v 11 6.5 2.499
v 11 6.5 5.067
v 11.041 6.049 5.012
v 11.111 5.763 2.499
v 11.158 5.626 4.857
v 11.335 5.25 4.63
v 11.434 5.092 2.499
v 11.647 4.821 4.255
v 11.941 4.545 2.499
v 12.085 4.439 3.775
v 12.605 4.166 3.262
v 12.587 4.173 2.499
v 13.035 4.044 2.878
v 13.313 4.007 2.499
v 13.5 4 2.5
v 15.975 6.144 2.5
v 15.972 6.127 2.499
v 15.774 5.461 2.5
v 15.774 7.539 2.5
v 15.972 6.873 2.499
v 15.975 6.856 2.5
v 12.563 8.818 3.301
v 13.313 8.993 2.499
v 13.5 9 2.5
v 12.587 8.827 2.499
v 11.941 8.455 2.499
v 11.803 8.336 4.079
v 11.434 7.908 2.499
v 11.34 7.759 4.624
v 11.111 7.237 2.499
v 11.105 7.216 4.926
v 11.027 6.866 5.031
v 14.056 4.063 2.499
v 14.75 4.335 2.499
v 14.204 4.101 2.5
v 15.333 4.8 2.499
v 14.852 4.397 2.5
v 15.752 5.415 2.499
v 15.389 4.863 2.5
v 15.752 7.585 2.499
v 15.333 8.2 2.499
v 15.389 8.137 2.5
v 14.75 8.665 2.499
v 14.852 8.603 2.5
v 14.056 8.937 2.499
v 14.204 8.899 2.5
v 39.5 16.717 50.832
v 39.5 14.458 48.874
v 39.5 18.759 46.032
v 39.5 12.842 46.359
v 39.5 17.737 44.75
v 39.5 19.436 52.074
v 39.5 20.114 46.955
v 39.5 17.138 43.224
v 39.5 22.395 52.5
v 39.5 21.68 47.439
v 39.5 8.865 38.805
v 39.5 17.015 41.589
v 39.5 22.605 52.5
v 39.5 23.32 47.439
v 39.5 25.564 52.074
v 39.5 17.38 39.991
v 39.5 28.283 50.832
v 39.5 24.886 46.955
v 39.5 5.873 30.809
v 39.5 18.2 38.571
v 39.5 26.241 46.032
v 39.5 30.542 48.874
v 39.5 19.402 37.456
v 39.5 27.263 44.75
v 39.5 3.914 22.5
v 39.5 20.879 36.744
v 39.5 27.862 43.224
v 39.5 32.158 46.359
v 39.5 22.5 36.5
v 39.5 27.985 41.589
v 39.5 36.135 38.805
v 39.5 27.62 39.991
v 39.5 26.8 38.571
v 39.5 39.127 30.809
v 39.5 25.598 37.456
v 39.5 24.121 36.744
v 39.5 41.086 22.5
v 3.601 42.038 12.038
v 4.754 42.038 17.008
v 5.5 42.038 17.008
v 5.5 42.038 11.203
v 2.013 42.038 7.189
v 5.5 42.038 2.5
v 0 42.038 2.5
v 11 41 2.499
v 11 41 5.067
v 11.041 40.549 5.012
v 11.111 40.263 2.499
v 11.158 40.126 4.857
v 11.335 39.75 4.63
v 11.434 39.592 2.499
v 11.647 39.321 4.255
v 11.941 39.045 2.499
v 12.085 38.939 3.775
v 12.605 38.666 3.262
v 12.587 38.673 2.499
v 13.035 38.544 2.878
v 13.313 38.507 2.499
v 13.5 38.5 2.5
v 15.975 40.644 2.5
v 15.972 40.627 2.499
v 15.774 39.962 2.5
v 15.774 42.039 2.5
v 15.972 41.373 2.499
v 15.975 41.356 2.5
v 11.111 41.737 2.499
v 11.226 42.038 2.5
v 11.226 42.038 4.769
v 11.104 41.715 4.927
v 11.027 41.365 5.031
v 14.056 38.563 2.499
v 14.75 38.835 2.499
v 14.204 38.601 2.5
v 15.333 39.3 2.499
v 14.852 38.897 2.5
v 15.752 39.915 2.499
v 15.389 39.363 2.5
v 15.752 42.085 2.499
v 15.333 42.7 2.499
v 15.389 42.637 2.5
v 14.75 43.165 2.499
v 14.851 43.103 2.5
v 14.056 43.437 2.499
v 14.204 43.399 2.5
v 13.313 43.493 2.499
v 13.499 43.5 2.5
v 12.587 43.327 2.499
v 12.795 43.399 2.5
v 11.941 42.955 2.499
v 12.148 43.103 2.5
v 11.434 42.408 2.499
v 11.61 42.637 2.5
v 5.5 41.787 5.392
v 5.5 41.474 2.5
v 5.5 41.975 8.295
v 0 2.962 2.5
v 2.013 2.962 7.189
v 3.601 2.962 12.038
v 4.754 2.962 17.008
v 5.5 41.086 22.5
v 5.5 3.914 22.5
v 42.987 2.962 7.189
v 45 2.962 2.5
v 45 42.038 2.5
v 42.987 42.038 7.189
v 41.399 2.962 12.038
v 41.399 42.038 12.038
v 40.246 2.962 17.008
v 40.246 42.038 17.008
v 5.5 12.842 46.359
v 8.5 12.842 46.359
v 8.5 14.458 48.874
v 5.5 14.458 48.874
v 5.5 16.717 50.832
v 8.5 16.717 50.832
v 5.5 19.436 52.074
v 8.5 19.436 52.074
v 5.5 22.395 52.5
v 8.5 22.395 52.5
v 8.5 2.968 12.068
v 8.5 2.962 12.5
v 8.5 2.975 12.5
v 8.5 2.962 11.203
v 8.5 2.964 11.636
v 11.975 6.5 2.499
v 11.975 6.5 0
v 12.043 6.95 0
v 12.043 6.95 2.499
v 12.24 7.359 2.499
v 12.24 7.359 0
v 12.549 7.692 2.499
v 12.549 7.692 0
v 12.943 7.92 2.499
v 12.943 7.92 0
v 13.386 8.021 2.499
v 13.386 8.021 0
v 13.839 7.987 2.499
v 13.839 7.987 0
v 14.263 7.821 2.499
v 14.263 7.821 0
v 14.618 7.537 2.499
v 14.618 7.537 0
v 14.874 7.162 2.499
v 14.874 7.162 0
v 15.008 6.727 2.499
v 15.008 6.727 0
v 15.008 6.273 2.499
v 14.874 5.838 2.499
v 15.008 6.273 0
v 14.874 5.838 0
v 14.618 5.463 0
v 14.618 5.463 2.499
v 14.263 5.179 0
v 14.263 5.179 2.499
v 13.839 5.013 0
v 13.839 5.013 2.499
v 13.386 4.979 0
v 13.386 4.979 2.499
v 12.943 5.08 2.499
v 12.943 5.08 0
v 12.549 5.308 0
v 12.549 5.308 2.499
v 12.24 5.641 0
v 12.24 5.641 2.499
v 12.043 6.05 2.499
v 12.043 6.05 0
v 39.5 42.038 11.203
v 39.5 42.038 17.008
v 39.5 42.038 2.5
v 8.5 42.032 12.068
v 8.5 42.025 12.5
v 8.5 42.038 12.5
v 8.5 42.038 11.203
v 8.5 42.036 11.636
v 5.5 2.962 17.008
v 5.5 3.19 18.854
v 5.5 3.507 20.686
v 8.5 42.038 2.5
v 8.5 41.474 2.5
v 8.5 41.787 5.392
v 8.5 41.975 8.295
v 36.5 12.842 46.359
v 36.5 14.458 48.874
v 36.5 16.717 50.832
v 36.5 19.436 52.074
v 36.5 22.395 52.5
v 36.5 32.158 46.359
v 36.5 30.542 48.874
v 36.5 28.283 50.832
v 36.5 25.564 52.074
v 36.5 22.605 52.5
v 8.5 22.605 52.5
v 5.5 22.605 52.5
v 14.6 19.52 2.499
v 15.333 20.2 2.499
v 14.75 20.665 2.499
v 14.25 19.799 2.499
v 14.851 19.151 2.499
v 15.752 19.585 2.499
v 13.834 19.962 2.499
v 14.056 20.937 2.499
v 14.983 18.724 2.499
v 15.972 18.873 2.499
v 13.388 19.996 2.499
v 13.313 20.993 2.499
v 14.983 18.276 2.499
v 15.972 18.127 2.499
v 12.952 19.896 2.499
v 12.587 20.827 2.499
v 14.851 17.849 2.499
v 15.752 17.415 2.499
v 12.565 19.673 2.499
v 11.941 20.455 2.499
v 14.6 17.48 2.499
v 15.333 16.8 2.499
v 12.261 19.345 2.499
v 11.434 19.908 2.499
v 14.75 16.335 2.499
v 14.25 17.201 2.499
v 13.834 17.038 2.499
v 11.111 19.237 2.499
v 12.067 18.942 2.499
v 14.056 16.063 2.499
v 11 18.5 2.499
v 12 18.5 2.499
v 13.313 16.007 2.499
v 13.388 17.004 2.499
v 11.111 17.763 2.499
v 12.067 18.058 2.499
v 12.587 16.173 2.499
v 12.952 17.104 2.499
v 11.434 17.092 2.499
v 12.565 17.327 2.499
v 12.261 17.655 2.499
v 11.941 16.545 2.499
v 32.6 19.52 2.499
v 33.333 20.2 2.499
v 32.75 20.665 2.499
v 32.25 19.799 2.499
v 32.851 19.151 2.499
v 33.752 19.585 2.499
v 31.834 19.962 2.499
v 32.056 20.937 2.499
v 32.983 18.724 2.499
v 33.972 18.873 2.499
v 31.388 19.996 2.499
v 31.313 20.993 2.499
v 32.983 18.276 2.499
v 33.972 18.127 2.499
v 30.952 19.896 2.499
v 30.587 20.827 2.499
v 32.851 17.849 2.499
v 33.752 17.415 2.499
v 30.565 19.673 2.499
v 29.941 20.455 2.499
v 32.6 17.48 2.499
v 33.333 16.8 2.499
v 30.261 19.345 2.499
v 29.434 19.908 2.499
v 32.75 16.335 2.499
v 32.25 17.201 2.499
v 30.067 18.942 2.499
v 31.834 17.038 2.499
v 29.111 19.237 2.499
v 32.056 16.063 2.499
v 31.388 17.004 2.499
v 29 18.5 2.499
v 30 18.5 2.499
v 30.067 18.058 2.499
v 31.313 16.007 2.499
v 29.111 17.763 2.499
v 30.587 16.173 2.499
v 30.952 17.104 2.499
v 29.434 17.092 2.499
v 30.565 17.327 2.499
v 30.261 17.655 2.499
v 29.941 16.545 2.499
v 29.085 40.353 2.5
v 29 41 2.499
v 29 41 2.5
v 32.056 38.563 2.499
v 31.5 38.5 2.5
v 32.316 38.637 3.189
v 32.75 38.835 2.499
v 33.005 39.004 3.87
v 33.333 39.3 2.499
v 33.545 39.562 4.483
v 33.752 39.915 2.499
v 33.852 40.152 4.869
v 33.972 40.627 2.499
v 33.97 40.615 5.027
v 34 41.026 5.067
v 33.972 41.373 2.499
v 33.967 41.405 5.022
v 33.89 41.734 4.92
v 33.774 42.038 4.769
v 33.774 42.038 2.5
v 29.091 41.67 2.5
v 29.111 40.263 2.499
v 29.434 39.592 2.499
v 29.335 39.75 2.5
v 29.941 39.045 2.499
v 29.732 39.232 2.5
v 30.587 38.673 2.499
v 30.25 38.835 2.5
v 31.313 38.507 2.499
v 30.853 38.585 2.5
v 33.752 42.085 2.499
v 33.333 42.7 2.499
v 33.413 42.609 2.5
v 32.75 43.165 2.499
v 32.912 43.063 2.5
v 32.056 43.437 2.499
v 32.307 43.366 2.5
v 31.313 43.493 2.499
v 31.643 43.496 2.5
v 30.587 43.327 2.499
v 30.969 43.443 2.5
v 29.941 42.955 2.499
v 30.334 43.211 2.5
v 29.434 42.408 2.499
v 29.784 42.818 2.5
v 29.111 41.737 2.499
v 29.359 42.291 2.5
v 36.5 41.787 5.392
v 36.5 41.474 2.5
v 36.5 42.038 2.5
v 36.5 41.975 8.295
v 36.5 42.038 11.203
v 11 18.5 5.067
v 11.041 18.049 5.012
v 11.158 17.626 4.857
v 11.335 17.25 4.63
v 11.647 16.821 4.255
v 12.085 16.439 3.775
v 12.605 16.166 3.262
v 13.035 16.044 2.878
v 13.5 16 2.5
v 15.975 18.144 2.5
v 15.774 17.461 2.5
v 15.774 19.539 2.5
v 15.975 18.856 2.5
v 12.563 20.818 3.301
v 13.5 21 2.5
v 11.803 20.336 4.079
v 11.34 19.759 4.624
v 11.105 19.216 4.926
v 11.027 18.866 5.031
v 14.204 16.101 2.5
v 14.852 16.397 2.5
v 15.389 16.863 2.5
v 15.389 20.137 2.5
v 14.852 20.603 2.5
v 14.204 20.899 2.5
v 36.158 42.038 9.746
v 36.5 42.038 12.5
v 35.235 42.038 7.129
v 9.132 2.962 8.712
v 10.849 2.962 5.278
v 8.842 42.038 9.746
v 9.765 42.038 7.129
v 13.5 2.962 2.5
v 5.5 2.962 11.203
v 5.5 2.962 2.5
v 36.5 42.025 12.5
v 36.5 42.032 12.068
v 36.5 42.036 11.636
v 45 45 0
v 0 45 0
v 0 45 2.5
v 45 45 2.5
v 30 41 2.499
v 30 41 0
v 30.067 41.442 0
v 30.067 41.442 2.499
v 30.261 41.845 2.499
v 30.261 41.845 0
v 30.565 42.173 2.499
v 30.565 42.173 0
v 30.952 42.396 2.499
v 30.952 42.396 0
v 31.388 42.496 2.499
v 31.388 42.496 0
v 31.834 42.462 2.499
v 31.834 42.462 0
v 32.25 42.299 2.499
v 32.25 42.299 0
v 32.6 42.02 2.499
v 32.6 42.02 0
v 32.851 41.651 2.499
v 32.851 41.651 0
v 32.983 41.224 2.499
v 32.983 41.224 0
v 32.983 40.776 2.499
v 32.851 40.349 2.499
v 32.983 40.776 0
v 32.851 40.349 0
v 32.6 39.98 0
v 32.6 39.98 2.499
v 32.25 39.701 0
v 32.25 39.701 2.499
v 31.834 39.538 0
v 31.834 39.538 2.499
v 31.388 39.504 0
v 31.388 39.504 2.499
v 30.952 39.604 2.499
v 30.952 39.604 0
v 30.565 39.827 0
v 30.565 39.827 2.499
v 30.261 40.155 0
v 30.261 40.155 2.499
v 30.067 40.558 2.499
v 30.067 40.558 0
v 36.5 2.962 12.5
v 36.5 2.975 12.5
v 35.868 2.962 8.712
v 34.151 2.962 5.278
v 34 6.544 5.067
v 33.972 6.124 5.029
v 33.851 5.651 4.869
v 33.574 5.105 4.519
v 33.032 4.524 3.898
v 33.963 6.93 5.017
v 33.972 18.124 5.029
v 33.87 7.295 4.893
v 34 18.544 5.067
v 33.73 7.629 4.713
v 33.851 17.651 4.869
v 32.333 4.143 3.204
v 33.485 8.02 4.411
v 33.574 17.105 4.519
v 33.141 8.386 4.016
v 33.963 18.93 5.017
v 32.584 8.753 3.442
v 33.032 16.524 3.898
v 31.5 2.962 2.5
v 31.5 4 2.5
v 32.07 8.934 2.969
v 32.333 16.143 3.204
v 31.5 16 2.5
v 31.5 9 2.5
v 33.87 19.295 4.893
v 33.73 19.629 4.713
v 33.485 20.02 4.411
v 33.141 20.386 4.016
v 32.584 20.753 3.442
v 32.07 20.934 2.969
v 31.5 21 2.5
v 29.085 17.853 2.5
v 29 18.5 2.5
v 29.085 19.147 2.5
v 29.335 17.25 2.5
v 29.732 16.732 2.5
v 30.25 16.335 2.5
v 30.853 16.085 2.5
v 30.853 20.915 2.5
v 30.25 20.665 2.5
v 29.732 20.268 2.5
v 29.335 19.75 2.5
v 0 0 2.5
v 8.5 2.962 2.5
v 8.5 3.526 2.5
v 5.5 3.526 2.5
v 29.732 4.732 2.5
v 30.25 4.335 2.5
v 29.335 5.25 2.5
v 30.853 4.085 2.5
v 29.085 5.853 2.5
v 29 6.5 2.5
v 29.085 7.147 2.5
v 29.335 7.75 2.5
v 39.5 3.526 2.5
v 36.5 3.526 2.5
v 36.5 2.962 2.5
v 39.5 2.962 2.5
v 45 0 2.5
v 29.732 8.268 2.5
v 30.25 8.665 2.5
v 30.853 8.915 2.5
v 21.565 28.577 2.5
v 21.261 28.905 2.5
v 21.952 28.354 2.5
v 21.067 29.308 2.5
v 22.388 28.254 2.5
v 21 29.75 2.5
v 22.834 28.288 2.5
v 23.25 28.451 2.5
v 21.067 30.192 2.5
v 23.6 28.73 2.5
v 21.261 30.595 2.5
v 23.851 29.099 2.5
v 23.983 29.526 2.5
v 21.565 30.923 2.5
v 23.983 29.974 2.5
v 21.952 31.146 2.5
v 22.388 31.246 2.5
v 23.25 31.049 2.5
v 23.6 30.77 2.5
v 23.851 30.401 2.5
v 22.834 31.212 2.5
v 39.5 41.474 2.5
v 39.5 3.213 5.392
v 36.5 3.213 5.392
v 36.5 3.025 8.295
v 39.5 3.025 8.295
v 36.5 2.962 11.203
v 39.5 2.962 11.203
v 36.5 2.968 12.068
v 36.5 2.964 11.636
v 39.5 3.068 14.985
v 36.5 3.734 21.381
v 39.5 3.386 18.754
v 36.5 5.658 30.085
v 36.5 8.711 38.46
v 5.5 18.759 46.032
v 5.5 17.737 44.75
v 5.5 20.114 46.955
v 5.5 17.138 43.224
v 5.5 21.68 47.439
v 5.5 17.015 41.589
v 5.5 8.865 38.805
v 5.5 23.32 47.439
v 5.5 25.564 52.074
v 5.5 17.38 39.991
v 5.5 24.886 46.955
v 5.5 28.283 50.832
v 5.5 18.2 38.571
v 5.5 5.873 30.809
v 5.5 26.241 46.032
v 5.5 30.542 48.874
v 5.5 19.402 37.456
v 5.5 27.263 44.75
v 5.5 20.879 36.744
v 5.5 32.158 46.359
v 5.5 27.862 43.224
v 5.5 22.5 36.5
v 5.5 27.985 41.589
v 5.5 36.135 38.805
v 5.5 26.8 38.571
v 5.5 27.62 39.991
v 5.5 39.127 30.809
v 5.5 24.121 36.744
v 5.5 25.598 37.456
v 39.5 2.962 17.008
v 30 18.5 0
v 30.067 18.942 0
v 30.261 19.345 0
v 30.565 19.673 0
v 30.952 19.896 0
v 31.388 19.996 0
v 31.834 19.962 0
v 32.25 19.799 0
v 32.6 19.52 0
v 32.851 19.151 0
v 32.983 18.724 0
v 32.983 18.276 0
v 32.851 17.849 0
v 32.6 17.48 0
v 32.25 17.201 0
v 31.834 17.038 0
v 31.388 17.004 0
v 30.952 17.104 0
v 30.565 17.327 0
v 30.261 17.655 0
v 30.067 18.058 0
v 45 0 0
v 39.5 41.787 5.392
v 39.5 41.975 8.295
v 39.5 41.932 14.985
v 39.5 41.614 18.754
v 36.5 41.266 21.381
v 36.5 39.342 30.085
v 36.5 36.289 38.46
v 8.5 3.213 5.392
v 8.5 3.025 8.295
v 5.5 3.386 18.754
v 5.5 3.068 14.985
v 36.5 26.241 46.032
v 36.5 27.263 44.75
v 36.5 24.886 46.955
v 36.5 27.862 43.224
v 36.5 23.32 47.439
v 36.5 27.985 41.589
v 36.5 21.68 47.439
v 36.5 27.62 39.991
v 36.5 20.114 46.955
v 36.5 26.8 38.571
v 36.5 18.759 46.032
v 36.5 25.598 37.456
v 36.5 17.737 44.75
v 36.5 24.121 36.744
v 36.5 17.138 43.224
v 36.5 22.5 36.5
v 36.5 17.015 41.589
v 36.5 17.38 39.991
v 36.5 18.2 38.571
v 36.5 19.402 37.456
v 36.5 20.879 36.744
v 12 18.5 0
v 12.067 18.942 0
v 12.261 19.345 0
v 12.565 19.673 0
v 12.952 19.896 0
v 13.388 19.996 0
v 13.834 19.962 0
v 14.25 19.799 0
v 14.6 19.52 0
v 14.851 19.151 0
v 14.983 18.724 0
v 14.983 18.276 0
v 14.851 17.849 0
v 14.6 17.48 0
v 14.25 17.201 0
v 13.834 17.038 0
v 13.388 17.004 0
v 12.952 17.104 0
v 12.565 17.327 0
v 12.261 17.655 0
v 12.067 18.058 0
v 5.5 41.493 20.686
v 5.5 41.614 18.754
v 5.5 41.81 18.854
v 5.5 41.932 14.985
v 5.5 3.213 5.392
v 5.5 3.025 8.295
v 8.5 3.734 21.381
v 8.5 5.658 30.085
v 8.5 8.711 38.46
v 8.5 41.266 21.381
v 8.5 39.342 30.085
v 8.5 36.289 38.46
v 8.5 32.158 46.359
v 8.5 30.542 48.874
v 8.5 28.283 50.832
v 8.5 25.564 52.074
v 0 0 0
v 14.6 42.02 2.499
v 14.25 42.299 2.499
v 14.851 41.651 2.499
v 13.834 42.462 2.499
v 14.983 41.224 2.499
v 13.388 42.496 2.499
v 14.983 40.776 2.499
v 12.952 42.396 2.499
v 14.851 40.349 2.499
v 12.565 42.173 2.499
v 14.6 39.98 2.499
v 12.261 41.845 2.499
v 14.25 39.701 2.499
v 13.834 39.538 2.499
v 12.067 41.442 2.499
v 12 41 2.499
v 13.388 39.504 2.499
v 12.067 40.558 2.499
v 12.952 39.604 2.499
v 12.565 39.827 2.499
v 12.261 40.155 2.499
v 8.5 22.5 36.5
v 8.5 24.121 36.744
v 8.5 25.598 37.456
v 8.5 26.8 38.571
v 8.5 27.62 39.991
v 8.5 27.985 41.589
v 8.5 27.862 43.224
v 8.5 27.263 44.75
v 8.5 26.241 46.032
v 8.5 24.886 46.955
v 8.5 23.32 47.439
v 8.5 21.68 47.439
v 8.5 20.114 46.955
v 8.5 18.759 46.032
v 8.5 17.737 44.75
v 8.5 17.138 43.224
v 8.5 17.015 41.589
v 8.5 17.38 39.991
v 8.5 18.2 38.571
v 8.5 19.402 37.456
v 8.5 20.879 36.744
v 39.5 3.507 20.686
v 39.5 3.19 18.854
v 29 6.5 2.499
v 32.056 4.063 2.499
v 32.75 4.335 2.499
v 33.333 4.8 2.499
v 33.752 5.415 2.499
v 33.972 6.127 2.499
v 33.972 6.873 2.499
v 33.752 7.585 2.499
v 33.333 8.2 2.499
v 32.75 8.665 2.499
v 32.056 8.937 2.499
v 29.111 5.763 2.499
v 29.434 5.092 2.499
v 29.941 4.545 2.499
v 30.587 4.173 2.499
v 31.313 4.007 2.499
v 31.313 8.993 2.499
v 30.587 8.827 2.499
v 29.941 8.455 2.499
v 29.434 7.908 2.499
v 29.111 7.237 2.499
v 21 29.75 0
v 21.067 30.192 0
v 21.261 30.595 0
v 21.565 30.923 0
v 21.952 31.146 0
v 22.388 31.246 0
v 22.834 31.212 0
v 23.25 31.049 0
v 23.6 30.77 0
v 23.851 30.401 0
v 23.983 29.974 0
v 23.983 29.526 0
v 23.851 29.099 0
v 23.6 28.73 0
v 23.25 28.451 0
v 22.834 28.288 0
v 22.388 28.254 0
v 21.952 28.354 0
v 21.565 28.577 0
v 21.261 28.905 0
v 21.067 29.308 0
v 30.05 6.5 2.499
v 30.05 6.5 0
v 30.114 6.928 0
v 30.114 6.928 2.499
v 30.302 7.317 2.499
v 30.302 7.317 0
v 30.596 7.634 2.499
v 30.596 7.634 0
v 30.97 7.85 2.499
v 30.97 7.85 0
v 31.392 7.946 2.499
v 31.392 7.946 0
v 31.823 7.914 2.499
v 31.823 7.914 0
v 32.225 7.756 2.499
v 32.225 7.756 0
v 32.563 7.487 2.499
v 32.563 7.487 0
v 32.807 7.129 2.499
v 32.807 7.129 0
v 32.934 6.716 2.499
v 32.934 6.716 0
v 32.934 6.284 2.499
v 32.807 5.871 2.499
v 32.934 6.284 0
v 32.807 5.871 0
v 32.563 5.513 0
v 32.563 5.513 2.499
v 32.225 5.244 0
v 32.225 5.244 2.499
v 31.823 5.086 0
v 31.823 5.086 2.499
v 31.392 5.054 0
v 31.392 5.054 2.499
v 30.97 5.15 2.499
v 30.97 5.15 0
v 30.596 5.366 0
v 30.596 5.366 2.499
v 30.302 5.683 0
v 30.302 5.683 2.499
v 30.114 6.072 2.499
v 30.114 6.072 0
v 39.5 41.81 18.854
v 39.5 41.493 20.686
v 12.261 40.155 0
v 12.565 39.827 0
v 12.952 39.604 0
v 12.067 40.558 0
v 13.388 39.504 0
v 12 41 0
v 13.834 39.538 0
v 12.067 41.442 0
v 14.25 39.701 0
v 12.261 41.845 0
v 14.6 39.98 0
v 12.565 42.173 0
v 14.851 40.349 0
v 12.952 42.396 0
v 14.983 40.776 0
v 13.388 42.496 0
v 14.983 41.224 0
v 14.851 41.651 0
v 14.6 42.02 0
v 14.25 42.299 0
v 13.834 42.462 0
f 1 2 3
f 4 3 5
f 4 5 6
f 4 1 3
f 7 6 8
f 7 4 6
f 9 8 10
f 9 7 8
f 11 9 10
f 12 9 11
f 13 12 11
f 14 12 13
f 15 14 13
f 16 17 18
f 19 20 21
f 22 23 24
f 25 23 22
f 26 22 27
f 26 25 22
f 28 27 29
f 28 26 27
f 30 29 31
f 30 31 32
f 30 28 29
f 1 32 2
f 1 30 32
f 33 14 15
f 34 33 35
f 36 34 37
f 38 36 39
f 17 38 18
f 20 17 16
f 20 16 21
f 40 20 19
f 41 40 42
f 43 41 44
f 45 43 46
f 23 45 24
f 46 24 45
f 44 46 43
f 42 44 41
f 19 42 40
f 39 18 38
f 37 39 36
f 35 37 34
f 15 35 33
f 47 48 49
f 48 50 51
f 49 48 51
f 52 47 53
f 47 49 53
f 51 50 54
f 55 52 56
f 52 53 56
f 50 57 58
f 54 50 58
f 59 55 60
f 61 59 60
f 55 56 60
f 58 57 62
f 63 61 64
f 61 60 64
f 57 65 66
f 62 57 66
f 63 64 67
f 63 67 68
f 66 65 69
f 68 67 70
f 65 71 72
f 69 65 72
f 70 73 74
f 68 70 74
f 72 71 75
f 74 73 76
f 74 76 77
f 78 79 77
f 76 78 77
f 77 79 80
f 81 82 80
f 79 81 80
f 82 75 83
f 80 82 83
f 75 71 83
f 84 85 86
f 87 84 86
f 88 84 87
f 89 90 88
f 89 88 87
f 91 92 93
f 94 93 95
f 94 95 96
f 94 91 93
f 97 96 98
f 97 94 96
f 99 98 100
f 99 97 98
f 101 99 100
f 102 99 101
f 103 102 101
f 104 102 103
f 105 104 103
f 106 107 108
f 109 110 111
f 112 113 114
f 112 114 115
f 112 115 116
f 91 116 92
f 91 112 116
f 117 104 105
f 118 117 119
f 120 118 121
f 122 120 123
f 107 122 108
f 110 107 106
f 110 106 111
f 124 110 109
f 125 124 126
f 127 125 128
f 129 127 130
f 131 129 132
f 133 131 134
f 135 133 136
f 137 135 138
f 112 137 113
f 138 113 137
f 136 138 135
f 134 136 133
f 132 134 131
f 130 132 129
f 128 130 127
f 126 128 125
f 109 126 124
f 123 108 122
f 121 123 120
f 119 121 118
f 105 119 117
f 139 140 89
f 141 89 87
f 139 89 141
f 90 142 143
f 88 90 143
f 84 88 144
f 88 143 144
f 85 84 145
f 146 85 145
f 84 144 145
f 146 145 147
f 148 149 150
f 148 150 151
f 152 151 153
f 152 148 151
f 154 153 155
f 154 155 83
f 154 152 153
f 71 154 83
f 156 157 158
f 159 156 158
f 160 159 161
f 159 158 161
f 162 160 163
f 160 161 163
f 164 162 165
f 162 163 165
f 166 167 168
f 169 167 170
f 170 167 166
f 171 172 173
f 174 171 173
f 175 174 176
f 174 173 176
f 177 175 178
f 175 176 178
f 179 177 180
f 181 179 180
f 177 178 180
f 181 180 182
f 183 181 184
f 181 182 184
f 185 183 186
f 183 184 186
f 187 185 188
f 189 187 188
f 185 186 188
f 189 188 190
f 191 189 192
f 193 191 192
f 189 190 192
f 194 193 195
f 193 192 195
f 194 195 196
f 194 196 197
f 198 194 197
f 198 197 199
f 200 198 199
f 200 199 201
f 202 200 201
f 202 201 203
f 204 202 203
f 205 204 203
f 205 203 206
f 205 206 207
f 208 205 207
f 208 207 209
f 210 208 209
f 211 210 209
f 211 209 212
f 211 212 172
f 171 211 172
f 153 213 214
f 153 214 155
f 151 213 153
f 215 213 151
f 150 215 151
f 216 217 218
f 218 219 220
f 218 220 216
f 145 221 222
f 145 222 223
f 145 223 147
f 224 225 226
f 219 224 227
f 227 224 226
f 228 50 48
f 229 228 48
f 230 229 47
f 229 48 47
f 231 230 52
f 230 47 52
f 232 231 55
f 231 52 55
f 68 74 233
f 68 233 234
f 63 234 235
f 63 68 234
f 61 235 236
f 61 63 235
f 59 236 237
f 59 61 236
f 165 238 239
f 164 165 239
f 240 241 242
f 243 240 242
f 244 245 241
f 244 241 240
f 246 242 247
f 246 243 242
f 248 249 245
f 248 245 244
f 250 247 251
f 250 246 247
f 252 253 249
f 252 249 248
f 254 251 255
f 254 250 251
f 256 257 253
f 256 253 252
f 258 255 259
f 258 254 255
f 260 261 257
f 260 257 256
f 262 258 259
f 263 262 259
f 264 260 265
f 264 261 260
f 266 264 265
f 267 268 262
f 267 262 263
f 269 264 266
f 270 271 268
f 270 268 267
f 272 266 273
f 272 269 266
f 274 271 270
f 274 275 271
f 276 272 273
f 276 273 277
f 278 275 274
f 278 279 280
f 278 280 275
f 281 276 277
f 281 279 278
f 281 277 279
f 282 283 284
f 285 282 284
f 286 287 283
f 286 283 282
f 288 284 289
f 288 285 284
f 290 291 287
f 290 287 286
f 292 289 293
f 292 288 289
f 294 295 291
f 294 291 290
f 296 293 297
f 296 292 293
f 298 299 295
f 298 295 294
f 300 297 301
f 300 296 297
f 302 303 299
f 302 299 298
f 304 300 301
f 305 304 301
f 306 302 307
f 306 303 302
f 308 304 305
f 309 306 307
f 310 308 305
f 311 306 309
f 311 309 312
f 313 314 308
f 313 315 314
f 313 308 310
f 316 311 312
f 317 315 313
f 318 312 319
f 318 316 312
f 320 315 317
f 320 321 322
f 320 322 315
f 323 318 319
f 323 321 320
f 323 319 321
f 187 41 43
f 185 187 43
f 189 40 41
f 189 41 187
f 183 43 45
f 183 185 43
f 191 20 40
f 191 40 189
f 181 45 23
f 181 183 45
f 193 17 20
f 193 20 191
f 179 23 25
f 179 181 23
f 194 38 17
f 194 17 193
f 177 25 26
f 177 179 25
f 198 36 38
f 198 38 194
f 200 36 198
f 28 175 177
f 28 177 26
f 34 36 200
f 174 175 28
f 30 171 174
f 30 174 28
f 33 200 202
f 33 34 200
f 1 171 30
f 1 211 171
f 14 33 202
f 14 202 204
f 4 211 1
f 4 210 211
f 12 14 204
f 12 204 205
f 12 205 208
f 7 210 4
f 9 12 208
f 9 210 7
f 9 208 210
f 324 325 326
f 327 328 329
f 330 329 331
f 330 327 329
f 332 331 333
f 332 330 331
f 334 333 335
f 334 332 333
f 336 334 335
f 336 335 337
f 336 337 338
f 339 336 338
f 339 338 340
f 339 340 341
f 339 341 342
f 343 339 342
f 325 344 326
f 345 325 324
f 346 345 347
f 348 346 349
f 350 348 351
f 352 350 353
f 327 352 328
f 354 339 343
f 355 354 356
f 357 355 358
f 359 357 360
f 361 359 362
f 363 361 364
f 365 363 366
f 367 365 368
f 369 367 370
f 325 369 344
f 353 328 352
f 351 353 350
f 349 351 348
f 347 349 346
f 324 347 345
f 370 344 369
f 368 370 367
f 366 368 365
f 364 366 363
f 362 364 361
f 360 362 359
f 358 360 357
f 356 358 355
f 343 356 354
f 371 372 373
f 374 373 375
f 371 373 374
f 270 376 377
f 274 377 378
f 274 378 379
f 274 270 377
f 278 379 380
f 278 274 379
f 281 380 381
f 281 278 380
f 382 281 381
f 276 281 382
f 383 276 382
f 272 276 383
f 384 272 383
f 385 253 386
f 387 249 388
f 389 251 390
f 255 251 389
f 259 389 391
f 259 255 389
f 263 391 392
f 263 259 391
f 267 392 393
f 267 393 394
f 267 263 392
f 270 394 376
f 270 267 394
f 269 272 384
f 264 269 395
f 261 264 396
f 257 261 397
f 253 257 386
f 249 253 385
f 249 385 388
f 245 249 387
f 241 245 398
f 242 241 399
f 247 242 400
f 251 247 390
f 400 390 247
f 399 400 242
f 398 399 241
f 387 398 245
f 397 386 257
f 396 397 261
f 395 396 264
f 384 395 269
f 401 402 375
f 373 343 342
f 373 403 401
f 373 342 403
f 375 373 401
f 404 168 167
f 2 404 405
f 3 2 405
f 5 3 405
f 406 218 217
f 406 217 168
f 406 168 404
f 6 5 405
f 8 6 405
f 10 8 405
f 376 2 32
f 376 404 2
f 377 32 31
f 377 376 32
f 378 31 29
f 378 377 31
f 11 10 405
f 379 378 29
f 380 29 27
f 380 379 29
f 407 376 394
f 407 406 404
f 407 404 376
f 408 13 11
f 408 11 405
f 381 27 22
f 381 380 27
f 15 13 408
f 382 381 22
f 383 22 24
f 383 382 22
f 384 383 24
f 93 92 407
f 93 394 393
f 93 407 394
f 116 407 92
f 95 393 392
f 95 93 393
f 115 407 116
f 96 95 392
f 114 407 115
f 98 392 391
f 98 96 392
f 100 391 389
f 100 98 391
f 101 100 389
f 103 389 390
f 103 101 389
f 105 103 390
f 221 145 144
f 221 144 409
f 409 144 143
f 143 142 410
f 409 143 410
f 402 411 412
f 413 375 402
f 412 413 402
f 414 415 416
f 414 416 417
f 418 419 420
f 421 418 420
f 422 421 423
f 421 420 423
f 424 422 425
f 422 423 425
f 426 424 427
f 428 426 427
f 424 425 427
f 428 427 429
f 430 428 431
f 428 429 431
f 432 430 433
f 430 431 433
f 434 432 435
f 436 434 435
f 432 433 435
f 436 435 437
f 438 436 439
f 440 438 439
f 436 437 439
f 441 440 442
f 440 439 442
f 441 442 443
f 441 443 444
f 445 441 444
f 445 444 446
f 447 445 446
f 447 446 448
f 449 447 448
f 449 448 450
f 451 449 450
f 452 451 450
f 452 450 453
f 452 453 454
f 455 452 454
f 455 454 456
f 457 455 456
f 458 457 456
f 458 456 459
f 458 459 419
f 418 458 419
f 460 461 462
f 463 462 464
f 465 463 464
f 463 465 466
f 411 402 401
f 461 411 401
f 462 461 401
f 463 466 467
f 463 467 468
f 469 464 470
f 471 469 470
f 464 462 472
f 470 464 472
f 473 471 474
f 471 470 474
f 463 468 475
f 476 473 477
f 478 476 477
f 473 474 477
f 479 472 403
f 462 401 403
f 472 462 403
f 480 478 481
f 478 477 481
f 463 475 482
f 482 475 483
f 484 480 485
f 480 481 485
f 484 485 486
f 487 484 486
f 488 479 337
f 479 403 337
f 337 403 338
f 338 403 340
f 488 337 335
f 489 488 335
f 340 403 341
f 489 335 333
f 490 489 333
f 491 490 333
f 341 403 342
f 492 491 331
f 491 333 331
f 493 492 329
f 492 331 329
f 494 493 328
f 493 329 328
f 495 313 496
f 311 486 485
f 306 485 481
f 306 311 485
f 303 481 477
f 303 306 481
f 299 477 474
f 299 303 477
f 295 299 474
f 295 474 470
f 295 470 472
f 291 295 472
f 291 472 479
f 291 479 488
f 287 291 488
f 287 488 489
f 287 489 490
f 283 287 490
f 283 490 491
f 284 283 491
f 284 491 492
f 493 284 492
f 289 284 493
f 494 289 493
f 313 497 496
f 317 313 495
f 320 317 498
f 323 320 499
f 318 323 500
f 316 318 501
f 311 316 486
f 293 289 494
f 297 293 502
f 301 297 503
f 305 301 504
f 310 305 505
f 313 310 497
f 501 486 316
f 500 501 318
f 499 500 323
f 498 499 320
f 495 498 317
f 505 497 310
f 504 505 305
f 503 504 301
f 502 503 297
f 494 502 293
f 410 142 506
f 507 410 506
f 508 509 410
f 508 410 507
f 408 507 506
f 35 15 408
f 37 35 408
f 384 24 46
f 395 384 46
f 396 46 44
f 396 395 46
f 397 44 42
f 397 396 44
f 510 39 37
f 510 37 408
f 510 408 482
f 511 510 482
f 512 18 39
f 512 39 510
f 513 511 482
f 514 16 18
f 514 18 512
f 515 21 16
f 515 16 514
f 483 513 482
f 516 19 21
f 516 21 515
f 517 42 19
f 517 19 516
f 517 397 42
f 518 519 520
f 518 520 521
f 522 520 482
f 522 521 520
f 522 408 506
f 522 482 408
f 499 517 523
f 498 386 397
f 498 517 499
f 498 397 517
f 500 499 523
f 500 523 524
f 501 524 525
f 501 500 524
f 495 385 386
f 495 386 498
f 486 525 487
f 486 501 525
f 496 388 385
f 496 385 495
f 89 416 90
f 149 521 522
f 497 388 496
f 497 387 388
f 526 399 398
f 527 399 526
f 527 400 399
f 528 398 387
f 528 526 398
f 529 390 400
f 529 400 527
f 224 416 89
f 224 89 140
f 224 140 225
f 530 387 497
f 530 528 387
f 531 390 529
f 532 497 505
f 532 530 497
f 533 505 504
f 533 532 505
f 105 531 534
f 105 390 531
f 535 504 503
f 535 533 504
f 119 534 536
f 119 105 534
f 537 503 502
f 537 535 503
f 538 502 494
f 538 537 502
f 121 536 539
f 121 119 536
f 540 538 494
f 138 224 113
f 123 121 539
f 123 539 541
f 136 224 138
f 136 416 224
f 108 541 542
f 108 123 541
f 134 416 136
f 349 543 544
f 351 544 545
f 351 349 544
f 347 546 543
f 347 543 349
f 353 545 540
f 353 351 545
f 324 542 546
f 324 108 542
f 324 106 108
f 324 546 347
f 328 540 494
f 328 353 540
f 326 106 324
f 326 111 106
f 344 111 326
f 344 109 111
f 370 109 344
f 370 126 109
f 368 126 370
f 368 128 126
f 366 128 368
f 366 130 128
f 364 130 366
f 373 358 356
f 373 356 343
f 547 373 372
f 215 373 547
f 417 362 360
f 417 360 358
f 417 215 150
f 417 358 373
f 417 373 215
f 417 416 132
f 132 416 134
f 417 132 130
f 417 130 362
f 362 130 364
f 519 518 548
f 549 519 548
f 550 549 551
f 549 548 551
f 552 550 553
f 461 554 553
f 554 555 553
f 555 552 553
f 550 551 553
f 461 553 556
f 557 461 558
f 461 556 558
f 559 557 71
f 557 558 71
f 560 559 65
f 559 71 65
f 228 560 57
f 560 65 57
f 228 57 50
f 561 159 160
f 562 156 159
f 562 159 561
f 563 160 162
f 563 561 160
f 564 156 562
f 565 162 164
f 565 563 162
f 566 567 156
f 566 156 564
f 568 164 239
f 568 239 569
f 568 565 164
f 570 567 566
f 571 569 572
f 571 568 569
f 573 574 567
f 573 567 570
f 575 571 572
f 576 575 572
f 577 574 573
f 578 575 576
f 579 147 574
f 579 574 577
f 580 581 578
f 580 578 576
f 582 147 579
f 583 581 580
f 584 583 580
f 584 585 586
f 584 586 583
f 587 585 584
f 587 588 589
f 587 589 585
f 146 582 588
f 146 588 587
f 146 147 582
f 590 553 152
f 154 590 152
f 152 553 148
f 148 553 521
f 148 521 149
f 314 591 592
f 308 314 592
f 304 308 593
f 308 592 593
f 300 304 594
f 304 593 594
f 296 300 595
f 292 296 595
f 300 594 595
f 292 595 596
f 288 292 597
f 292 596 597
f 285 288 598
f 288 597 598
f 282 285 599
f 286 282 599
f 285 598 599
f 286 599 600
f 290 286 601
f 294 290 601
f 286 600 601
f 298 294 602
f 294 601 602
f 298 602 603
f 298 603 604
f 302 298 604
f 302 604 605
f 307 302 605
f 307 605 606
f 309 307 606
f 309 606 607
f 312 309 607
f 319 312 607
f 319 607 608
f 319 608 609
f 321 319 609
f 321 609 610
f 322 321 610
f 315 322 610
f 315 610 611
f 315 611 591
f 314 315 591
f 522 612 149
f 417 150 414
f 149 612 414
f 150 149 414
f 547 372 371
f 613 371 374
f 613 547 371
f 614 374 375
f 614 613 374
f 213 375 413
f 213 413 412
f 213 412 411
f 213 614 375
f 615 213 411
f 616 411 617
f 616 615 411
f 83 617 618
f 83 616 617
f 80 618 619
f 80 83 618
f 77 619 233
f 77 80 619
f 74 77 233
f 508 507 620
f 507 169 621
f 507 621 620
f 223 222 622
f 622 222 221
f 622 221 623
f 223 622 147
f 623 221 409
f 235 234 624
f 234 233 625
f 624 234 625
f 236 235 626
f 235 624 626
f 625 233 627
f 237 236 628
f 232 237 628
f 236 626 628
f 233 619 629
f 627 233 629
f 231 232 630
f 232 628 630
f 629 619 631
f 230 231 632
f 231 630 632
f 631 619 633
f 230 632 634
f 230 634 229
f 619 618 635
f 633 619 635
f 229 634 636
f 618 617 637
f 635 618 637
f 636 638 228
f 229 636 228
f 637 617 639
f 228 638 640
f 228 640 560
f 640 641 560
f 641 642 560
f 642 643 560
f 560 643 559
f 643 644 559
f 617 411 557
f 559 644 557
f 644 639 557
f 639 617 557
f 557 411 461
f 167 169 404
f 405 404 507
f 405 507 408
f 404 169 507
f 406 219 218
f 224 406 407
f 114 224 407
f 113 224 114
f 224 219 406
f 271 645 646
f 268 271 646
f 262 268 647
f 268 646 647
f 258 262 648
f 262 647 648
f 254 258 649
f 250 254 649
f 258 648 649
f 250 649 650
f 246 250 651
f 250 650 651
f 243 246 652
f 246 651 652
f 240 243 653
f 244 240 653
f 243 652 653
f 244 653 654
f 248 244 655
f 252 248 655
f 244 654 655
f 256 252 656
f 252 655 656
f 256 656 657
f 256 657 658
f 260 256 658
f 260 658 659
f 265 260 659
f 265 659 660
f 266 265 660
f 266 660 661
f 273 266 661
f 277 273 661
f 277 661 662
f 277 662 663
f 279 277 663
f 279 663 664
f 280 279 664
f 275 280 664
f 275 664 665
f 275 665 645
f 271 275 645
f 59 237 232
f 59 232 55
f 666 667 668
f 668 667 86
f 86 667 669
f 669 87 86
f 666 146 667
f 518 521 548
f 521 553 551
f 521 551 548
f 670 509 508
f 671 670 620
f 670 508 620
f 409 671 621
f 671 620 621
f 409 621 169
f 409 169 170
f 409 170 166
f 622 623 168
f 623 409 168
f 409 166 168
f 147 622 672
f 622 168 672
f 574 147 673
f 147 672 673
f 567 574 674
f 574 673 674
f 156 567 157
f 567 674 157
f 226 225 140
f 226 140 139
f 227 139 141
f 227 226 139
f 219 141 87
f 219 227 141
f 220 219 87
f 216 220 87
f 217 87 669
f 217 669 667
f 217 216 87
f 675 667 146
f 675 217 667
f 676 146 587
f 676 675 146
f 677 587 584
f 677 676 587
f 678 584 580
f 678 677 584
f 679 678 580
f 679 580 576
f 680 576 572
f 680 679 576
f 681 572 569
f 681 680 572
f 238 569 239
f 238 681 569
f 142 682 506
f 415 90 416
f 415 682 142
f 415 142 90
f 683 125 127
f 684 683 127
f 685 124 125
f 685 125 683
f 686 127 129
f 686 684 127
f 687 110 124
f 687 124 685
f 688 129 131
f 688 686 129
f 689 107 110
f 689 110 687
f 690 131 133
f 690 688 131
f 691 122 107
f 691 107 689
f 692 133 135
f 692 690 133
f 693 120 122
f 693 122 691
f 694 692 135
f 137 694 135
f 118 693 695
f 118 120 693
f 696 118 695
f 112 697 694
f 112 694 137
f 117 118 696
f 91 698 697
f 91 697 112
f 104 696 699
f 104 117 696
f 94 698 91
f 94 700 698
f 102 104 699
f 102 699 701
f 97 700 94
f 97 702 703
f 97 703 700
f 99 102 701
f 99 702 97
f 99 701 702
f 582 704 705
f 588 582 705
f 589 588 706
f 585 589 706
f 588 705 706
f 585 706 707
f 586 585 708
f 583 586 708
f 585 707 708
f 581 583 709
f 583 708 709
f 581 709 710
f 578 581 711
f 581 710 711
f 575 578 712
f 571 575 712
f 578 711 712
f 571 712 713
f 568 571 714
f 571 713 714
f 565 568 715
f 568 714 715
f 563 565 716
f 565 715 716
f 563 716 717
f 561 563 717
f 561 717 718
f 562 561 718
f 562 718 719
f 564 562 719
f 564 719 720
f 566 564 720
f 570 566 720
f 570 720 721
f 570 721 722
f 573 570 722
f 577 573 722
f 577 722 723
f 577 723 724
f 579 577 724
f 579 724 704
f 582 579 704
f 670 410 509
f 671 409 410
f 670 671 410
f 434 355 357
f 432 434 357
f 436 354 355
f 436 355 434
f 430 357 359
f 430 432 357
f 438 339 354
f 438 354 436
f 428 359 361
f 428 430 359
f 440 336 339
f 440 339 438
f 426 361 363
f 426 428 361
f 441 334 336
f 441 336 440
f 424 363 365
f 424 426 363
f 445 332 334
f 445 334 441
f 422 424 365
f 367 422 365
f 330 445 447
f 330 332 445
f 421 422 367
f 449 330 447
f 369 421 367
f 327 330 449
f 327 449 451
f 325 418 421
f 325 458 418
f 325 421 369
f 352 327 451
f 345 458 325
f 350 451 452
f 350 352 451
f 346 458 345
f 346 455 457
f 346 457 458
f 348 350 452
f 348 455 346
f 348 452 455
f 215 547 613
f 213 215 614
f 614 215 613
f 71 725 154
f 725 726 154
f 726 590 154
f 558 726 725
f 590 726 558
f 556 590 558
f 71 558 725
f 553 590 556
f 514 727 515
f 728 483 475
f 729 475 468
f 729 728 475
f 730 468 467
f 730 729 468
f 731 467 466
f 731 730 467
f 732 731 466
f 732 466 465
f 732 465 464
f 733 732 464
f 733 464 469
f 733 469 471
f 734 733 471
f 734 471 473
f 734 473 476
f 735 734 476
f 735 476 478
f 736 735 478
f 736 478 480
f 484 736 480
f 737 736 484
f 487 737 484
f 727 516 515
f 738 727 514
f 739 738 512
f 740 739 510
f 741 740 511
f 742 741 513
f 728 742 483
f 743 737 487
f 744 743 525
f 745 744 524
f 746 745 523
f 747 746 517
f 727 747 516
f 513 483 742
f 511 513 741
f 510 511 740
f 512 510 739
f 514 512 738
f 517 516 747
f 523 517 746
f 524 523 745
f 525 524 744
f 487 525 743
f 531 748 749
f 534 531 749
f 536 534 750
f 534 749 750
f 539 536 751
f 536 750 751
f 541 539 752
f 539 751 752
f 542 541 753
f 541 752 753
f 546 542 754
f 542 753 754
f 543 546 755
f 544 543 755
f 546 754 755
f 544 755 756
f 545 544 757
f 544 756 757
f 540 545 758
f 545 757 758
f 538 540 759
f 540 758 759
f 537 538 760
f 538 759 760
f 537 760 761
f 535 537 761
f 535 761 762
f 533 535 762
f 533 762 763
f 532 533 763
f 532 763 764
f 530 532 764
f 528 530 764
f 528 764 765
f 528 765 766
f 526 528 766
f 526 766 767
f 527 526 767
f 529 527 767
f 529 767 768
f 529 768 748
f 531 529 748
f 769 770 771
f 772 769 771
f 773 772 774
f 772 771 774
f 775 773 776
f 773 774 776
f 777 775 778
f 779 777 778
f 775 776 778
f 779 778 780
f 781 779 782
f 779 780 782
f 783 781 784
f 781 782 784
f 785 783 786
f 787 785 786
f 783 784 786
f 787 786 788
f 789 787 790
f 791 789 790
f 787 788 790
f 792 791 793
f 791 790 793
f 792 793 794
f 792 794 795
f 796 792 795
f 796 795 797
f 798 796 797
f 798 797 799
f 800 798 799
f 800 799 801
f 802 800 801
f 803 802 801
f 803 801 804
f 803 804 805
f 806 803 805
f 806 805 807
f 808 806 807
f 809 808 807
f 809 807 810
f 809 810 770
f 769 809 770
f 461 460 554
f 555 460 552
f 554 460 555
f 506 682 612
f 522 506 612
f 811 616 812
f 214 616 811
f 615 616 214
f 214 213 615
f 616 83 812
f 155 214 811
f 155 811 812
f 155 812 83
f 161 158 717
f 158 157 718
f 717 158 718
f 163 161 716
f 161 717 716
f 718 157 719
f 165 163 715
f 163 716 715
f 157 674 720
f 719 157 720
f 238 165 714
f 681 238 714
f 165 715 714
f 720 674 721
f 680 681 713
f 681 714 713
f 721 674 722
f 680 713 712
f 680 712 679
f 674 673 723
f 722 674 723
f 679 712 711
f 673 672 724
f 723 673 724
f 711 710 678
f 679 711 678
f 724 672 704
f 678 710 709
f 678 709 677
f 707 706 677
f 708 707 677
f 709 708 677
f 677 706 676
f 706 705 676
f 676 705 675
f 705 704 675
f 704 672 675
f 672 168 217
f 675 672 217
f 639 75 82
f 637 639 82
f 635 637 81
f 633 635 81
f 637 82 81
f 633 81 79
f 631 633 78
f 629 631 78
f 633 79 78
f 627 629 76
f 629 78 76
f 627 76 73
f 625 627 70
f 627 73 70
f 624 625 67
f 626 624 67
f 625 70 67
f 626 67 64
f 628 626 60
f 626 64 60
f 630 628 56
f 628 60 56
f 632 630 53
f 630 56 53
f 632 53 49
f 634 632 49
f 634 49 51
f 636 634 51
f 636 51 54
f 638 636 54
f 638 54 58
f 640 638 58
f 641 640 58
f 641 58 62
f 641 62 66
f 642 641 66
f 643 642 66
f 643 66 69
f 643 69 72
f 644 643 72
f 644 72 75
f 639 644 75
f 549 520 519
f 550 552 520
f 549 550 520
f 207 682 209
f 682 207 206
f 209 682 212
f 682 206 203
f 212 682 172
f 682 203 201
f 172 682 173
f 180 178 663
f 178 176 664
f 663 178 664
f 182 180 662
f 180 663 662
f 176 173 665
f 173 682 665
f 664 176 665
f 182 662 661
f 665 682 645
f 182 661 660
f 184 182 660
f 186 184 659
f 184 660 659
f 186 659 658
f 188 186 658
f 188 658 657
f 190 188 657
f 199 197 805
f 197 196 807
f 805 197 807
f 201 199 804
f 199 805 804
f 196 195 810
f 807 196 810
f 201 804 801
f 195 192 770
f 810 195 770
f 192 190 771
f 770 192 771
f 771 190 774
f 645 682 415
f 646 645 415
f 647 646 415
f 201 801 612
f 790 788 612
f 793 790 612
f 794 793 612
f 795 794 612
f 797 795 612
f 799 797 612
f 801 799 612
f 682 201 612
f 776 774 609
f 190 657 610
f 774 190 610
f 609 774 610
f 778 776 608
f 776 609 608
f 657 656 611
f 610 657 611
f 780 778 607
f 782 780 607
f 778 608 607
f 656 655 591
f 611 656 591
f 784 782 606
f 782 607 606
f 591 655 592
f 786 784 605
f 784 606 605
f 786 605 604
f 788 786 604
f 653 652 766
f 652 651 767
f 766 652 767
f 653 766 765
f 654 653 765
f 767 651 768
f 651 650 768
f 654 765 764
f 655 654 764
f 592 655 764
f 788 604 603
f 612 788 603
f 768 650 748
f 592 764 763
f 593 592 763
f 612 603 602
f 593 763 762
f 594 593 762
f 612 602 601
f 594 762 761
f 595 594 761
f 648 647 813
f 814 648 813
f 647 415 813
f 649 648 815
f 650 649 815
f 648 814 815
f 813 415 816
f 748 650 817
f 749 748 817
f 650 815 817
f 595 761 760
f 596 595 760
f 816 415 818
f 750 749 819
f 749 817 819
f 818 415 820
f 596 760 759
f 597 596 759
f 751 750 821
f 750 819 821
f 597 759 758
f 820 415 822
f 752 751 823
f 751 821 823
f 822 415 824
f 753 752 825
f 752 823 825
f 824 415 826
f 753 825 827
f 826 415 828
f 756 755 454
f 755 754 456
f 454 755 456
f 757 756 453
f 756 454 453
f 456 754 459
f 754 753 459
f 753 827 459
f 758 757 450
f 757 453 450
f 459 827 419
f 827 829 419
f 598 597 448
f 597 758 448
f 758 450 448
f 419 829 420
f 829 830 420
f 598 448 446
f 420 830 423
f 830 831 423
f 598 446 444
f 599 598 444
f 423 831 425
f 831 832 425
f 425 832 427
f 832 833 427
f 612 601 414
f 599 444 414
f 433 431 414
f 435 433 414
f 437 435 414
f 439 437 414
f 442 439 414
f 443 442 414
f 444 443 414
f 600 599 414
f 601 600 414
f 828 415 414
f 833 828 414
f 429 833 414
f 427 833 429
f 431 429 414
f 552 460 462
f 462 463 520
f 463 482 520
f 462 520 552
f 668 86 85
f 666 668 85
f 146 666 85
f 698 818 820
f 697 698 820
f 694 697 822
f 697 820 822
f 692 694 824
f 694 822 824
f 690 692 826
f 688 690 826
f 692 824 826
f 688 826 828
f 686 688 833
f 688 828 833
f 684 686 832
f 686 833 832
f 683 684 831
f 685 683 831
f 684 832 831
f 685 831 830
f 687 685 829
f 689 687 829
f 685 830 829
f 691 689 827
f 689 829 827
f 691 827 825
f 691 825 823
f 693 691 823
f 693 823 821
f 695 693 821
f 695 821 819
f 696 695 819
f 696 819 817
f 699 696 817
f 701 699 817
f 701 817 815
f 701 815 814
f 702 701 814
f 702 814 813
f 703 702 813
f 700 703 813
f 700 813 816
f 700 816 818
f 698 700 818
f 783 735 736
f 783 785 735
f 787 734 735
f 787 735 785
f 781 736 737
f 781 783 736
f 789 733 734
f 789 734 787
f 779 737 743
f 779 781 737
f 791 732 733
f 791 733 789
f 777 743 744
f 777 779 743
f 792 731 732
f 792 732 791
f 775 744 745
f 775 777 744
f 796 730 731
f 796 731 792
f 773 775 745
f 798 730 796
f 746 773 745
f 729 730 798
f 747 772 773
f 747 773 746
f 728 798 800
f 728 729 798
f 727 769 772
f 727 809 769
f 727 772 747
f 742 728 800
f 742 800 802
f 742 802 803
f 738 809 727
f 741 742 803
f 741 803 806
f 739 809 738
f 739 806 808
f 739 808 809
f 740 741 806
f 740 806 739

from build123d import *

# Parameters (mm, degrees)
SKETCH_1_W               = 45
SKETCH_1_H               = 45
EXTRUDE_1_DEPTH          = 2.5
EXTRUDE_2_DEPTH          = 50
SKETCH_3_R               = 5.5
CUT_EXTRUDE_1_DEPTH      = 80.633535649
CUT_EXTRUDE_2_DEPTH      = 80.633535649
SKETCH_5_W               = 5
SKETCH_5_H               = 39.075696326
EXTRUDE_3_DEPTH          = 10
CUT_EXTRUDE_3_DEPTH      = 81.922374398
SKETCH_7_W               = 5.5
SKETCH_7_H               = 39.075696326
EXTRUDE_4_DEPTH          = 20
CUT_EXTRUDE_4_DEPTH      = 83.5
CUT_EXTRUDE_5_DEPTH      = 81.922374398
CUT_EXTRUDE_7_REACH      = 84.5
SKETCH_12_R              = 1.5
SKETCH_12_R_2            = 1.525256865
SKETCH_12_R_3            = 1.450491537
CUT_EXTRUDE_8_DEPTH      = 10
CUT_EXTRUDE_8_DEPTH_BACK = 0.001
SKETCH_13_R              = 2.5


with BuildPart() as part:
    # 草图1 → 凸台-拉伸1 (new body)
    with BuildSketch(Plane.XY):
        with Locations((22.5, 22.5)):
            Rectangle(SKETCH_1_W, SKETCH_1_H)
    extrude(amount=EXTRUDE_1_DEPTH)

    # 草图2 → 凸台-拉伸2 (add)
    with BuildSketch(Plane.XY.offset(2.5)):
        Polygon((36.5, 22.5), (36.5, 0), (39.5, 0), (39.5, 45), (36.5, 45), align=None)
        Polygon((8.5, 45), (8.5, 22.5), (8.5, 0), (5.5, 0), (5.5, 45), align=None)
    extrude(amount=EXTRUDE_2_DEPTH)

    # 草图3 → 切除-拉伸1 (cut, through all)
    with BuildSketch(Plane(origin=(39.5, 0, 0), x_dir=(0, 0, -1), z_dir=(1, 0, 0))):
        with Locations((-42, 22.5)):
            Circle(SKETCH_3_R)
    extrude(amount=-CUT_EXTRUDE_1_DEPTH, mode=Mode.SUBTRACT)

    # 草图4 → 切除-拉伸2 (cut, through all)
    with BuildSketch(Plane(origin=(39.5, 0, 0), x_dir=(0, 0, -1), z_dir=(1, 0, 0))):
        with BuildLine():
            Line((-2.5, 45), (-2.5, 41.474247654))
            ThreePointArc((-2.5, 41.474247654), (-25.225749209, 40.564939101), (-46.358725725, 32.157571933))
            ThreePointArc((-46.358725725, 32.157571933), (-50.832231318, 28.283182945), (-52.5, 22.605006306))
            Line((-52.5, 22.605006306), (-52.5, 45))
            Line((-52.5, 45), (-2.5, 45))
        make_face()
        with BuildLine():
            Line((-52.5, 22.394993694), (-52.5, 0))
            Line((-52.5, 0), (-2.5, 0))
            Line((-2.5, 0), (-2.5, 3.525752346))
            ThreePointArc((-2.5, 3.525752346), (-25.225749209, 4.435060899), (-46.358725725, 12.842428067))
            ThreePointArc((-46.358725725, 12.842428067), (-50.832231318, 16.716817055), (-52.5, 22.394993694))
        make_face()
    extrude(amount=-CUT_EXTRUDE_2_DEPTH, mode=Mode.SUBTRACT)

    # 草图5 → 凸台-拉伸3 (add)
    with BuildSketch(Plane.XY.offset(2.5)):
        with Locations((11, 22.5)):
            Rectangle(SKETCH_5_W, SKETCH_5_H)
        with Locations((34, 22.5)):
            Rectangle(SKETCH_5_W, SKETCH_5_H)
    extrude(amount=EXTRUDE_3_DEPTH)

    # 草图6 → 切除-拉伸3 (cut, through all)
    with BuildSketch(Plane(origin=(0, 42.037848163, 0), x_dir=(1, 0, 0), z_dir=(0, 1, 0))):
        with BuildLine():
            Line((13.5, -2.5), (13.5, -12.5))
            Line((13.5, -12.5), (8.5, -12.5))
            ThreePointArc((8.5, -12.5), (9.861833326, -6.930916663), (13.5, -2.5))
        make_face()
        with BuildLine():
            Line((31.5, -2.5), (31.5, -12.5))
            Line((31.5, -12.5), (36.5, -12.5))
            ThreePointArc((36.5, -12.5), (35.138166674, -6.930916663), (31.5, -2.5))
        make_face()
    extrude(amount=-CUT_EXTRUDE_3_DEPTH, mode=Mode.SUBTRACT)

    # 草图7 → 凸台-拉伸4 (add)
    with BuildSketch(Plane.XY.offset(2.5)):
        with Locations((2.75, 22.5)):
            Rectangle(SKETCH_7_W, SKETCH_7_H)
        with Locations((42.25, 22.5)):
            Rectangle(SKETCH_7_W, SKETCH_7_H)
    extrude(amount=EXTRUDE_4_DEPTH)

    # 草图8 → 切除-拉伸4 (cut, through all)
    with BuildSketch(Plane(origin=(45, 0, 0), x_dir=(0, 0, -1), z_dir=(1, 0, 0))):
        with BuildLine():
            Line((-22.5, 41.085625399), (-22.5, 42.037848163))
            Line((-22.5, 42.037848163), (-17.008220021, 42.037848163))
            ThreePointArc((-17.008220021, 42.037848163), (-19.771631621, 41.662789638), (-22.5, 41.085625399))
        make_face()
        with BuildLine():
            Line((-22.5, 3.914374601), (-22.5, 2.962151837))
            Line((-22.5, 2.962151837), (-17.008220021, 2.962151837))
            ThreePointArc((-17.008220021, 2.962151837), (-19.771631621, 3.337210362), (-22.5, 3.914374601))
        make_face()
    extrude(amount=-CUT_EXTRUDE_4_DEPTH, mode=Mode.SUBTRACT)

    # 草图9 → 切除-拉伸5 (cut, through all)
    with BuildSketch(Plane(origin=(0, 2.962151837, 0), x_dir=(-1, 0, 0), z_dir=(0, -1, 0))):
        with BuildLine():
            Line((-39.5, -22.5), (-45, -22.5))
            Line((-45, -22.5), (-45, -2.5))
            ThreePointArc((-45, -2.5), (-41.339785895, -12.249691121), (-39.5, -22.5))
        make_face()
        with BuildLine():
            Line((-5.5, -22.5), (0, -22.5))
            Line((0, -22.5), (0, -2.5))
            ThreePointArc((0, -2.5), (-3.660214105, -12.249691121), (-5.5, -22.5))
        make_face()
    extrude(amount=-CUT_EXTRUDE_5_DEPTH, mode=Mode.SUBTRACT)

    # 草图12 → 切除-拉伸7 (cut, up to next)
    with BuildSketch(Plane(origin=(0, 0, 0), x_dir=(-1, 0, 0), z_dir=(0, 0, -1)), mode=Mode.PRIVATE) as cut_extrude_7_sk1:
        with Locations((-13.5, 18.5)):
            Circle(SKETCH_12_R)
    cut_extrude_7_tool1 = extrude(cut_extrude_7_sk1.sketch, amount=-CUT_EXTRUDE_7_REACH, mode=Mode.PRIVATE) & part.part
    # 草图12 → 切除-拉伸7 (cut, up to next)
    with BuildSketch(Plane(origin=(0, 0, 0), x_dir=(-1, 0, 0), z_dir=(0, 0, -1)), mode=Mode.PRIVATE) as cut_extrude_7_sk2:
        with Locations((-13.5, 6.5)):
            Circle(SKETCH_12_R_2)
    cut_extrude_7_tool2 = extrude(cut_extrude_7_sk2.sketch, amount=-CUT_EXTRUDE_7_REACH, mode=Mode.PRIVATE) & part.part
    # 草图12 → 切除-拉伸7 (cut, up to next)
    with BuildSketch(Plane(origin=(0, 0, 0), x_dir=(-1, 0, 0), z_dir=(0, 0, -1)), mode=Mode.PRIVATE) as cut_extrude_7_sk3:
        with Locations((-31.5, 18.5)):
            Circle(SKETCH_12_R)
    cut_extrude_7_tool3 = extrude(cut_extrude_7_sk3.sketch, amount=-CUT_EXTRUDE_7_REACH, mode=Mode.PRIVATE) & part.part
    # 草图12 → 切除-拉伸7 (cut, up to next)
    with BuildSketch(Plane(origin=(0, 0, 0), x_dir=(-1, 0, 0), z_dir=(0, 0, -1)), mode=Mode.PRIVATE) as cut_extrude_7_sk4:
        with Locations((-31.5, 6.5)):
            Circle(SKETCH_12_R_3)
    cut_extrude_7_tool4 = extrude(cut_extrude_7_sk4.sketch, amount=-CUT_EXTRUDE_7_REACH, mode=Mode.PRIVATE) & part.part
    # 草图12 → 切除-拉伸7 (cut, up to next)
    with BuildSketch(Plane(origin=(0, 0, 0), x_dir=(-1, 0, 0), z_dir=(0, 0, -1)), mode=Mode.PRIVATE) as cut_extrude_7_sk5:
        with Locations((-13.5, 41)):
            Circle(SKETCH_12_R)
    cut_extrude_7_tool5 = extrude(cut_extrude_7_sk5.sketch, amount=-CUT_EXTRUDE_7_REACH, mode=Mode.PRIVATE) & part.part
    # 草图12 → 切除-拉伸7 (cut, up to next)
    with BuildSketch(Plane(origin=(0, 0, 0), x_dir=(-1, 0, 0), z_dir=(0, 0, -1)), mode=Mode.PRIVATE) as cut_extrude_7_sk6:
        with Locations((-31.5, 41)):
            Circle(SKETCH_12_R)
    cut_extrude_7_tool6 = extrude(cut_extrude_7_sk6.sketch, amount=-CUT_EXTRUDE_7_REACH, mode=Mode.PRIVATE) & part.part
    # 草图12 → 切除-拉伸7 (cut, up to next)
    with BuildSketch(Plane(origin=(0, 0, 0), x_dir=(-1, 0, 0), z_dir=(0, 0, -1)), mode=Mode.PRIVATE) as cut_extrude_7_sk7:
        with Locations((-22.5, 29.75)):
            Circle(SKETCH_12_R)
    cut_extrude_7_tool7 = extrude(cut_extrude_7_sk7.sketch, amount=-CUT_EXTRUDE_7_REACH, mode=Mode.PRIVATE) & part.part
    add(cut_extrude_7_tool1.solids().sort_by_distance((13.5, 18.5, 0))[0], mode=Mode.SUBTRACT)
    add(cut_extrude_7_tool2.solids().sort_by_distance((13.5, 6.5, 0))[0], mode=Mode.SUBTRACT)
    add(cut_extrude_7_tool3.solids().sort_by_distance((31.5, 18.5, 0))[0], mode=Mode.SUBTRACT)
    add(cut_extrude_7_tool4.solids().sort_by_distance((31.5, 6.5, 0))[0], mode=Mode.SUBTRACT)
    add(cut_extrude_7_tool5.solids().sort_by_distance((13.5, 41, 0))[0], mode=Mode.SUBTRACT)
    add(cut_extrude_7_tool6.solids().sort_by_distance((31.5, 41, 0))[0], mode=Mode.SUBTRACT)
    add(cut_extrude_7_tool7.solids().sort_by_distance((22.5, 29.75, 0))[0], mode=Mode.SUBTRACT)

    # 草图13 → 切除-拉伸8 (cut, two sides: drawn at the far end of the back side and taken through both)
    with BuildSketch(Plane.XY.offset(2.5).offset(-CUT_EXTRUDE_8_DEPTH_BACK)):
        with Locations(Location((13.5, 6.5, 0), (0, 0, 180))):
            Circle(SKETCH_13_R)
        with Locations(Location((13.5, 18.5, 0), (0, 0, 180))):
            Circle(SKETCH_13_R)
        with Locations(Location((13.5, 41, 0), (0, 0, 180))):
            Circle(SKETCH_13_R)
        with Locations(Location((31.5, 41, 0), (0, 0, 180))):
            Circle(SKETCH_13_R)
        with Locations(Location((31.5, 18.5, 0), (0, 0, 180))):
            Circle(SKETCH_13_R)
        with Locations(Location((31.5, 6.5, 0), (0, 0, 180))):
            Circle(SKETCH_13_R)
    extrude(amount=CUT_EXTRUDE_8_DEPTH + CUT_EXTRUDE_8_DEPTH_BACK, mode=Mode.SUBTRACT)


solid = part.part
